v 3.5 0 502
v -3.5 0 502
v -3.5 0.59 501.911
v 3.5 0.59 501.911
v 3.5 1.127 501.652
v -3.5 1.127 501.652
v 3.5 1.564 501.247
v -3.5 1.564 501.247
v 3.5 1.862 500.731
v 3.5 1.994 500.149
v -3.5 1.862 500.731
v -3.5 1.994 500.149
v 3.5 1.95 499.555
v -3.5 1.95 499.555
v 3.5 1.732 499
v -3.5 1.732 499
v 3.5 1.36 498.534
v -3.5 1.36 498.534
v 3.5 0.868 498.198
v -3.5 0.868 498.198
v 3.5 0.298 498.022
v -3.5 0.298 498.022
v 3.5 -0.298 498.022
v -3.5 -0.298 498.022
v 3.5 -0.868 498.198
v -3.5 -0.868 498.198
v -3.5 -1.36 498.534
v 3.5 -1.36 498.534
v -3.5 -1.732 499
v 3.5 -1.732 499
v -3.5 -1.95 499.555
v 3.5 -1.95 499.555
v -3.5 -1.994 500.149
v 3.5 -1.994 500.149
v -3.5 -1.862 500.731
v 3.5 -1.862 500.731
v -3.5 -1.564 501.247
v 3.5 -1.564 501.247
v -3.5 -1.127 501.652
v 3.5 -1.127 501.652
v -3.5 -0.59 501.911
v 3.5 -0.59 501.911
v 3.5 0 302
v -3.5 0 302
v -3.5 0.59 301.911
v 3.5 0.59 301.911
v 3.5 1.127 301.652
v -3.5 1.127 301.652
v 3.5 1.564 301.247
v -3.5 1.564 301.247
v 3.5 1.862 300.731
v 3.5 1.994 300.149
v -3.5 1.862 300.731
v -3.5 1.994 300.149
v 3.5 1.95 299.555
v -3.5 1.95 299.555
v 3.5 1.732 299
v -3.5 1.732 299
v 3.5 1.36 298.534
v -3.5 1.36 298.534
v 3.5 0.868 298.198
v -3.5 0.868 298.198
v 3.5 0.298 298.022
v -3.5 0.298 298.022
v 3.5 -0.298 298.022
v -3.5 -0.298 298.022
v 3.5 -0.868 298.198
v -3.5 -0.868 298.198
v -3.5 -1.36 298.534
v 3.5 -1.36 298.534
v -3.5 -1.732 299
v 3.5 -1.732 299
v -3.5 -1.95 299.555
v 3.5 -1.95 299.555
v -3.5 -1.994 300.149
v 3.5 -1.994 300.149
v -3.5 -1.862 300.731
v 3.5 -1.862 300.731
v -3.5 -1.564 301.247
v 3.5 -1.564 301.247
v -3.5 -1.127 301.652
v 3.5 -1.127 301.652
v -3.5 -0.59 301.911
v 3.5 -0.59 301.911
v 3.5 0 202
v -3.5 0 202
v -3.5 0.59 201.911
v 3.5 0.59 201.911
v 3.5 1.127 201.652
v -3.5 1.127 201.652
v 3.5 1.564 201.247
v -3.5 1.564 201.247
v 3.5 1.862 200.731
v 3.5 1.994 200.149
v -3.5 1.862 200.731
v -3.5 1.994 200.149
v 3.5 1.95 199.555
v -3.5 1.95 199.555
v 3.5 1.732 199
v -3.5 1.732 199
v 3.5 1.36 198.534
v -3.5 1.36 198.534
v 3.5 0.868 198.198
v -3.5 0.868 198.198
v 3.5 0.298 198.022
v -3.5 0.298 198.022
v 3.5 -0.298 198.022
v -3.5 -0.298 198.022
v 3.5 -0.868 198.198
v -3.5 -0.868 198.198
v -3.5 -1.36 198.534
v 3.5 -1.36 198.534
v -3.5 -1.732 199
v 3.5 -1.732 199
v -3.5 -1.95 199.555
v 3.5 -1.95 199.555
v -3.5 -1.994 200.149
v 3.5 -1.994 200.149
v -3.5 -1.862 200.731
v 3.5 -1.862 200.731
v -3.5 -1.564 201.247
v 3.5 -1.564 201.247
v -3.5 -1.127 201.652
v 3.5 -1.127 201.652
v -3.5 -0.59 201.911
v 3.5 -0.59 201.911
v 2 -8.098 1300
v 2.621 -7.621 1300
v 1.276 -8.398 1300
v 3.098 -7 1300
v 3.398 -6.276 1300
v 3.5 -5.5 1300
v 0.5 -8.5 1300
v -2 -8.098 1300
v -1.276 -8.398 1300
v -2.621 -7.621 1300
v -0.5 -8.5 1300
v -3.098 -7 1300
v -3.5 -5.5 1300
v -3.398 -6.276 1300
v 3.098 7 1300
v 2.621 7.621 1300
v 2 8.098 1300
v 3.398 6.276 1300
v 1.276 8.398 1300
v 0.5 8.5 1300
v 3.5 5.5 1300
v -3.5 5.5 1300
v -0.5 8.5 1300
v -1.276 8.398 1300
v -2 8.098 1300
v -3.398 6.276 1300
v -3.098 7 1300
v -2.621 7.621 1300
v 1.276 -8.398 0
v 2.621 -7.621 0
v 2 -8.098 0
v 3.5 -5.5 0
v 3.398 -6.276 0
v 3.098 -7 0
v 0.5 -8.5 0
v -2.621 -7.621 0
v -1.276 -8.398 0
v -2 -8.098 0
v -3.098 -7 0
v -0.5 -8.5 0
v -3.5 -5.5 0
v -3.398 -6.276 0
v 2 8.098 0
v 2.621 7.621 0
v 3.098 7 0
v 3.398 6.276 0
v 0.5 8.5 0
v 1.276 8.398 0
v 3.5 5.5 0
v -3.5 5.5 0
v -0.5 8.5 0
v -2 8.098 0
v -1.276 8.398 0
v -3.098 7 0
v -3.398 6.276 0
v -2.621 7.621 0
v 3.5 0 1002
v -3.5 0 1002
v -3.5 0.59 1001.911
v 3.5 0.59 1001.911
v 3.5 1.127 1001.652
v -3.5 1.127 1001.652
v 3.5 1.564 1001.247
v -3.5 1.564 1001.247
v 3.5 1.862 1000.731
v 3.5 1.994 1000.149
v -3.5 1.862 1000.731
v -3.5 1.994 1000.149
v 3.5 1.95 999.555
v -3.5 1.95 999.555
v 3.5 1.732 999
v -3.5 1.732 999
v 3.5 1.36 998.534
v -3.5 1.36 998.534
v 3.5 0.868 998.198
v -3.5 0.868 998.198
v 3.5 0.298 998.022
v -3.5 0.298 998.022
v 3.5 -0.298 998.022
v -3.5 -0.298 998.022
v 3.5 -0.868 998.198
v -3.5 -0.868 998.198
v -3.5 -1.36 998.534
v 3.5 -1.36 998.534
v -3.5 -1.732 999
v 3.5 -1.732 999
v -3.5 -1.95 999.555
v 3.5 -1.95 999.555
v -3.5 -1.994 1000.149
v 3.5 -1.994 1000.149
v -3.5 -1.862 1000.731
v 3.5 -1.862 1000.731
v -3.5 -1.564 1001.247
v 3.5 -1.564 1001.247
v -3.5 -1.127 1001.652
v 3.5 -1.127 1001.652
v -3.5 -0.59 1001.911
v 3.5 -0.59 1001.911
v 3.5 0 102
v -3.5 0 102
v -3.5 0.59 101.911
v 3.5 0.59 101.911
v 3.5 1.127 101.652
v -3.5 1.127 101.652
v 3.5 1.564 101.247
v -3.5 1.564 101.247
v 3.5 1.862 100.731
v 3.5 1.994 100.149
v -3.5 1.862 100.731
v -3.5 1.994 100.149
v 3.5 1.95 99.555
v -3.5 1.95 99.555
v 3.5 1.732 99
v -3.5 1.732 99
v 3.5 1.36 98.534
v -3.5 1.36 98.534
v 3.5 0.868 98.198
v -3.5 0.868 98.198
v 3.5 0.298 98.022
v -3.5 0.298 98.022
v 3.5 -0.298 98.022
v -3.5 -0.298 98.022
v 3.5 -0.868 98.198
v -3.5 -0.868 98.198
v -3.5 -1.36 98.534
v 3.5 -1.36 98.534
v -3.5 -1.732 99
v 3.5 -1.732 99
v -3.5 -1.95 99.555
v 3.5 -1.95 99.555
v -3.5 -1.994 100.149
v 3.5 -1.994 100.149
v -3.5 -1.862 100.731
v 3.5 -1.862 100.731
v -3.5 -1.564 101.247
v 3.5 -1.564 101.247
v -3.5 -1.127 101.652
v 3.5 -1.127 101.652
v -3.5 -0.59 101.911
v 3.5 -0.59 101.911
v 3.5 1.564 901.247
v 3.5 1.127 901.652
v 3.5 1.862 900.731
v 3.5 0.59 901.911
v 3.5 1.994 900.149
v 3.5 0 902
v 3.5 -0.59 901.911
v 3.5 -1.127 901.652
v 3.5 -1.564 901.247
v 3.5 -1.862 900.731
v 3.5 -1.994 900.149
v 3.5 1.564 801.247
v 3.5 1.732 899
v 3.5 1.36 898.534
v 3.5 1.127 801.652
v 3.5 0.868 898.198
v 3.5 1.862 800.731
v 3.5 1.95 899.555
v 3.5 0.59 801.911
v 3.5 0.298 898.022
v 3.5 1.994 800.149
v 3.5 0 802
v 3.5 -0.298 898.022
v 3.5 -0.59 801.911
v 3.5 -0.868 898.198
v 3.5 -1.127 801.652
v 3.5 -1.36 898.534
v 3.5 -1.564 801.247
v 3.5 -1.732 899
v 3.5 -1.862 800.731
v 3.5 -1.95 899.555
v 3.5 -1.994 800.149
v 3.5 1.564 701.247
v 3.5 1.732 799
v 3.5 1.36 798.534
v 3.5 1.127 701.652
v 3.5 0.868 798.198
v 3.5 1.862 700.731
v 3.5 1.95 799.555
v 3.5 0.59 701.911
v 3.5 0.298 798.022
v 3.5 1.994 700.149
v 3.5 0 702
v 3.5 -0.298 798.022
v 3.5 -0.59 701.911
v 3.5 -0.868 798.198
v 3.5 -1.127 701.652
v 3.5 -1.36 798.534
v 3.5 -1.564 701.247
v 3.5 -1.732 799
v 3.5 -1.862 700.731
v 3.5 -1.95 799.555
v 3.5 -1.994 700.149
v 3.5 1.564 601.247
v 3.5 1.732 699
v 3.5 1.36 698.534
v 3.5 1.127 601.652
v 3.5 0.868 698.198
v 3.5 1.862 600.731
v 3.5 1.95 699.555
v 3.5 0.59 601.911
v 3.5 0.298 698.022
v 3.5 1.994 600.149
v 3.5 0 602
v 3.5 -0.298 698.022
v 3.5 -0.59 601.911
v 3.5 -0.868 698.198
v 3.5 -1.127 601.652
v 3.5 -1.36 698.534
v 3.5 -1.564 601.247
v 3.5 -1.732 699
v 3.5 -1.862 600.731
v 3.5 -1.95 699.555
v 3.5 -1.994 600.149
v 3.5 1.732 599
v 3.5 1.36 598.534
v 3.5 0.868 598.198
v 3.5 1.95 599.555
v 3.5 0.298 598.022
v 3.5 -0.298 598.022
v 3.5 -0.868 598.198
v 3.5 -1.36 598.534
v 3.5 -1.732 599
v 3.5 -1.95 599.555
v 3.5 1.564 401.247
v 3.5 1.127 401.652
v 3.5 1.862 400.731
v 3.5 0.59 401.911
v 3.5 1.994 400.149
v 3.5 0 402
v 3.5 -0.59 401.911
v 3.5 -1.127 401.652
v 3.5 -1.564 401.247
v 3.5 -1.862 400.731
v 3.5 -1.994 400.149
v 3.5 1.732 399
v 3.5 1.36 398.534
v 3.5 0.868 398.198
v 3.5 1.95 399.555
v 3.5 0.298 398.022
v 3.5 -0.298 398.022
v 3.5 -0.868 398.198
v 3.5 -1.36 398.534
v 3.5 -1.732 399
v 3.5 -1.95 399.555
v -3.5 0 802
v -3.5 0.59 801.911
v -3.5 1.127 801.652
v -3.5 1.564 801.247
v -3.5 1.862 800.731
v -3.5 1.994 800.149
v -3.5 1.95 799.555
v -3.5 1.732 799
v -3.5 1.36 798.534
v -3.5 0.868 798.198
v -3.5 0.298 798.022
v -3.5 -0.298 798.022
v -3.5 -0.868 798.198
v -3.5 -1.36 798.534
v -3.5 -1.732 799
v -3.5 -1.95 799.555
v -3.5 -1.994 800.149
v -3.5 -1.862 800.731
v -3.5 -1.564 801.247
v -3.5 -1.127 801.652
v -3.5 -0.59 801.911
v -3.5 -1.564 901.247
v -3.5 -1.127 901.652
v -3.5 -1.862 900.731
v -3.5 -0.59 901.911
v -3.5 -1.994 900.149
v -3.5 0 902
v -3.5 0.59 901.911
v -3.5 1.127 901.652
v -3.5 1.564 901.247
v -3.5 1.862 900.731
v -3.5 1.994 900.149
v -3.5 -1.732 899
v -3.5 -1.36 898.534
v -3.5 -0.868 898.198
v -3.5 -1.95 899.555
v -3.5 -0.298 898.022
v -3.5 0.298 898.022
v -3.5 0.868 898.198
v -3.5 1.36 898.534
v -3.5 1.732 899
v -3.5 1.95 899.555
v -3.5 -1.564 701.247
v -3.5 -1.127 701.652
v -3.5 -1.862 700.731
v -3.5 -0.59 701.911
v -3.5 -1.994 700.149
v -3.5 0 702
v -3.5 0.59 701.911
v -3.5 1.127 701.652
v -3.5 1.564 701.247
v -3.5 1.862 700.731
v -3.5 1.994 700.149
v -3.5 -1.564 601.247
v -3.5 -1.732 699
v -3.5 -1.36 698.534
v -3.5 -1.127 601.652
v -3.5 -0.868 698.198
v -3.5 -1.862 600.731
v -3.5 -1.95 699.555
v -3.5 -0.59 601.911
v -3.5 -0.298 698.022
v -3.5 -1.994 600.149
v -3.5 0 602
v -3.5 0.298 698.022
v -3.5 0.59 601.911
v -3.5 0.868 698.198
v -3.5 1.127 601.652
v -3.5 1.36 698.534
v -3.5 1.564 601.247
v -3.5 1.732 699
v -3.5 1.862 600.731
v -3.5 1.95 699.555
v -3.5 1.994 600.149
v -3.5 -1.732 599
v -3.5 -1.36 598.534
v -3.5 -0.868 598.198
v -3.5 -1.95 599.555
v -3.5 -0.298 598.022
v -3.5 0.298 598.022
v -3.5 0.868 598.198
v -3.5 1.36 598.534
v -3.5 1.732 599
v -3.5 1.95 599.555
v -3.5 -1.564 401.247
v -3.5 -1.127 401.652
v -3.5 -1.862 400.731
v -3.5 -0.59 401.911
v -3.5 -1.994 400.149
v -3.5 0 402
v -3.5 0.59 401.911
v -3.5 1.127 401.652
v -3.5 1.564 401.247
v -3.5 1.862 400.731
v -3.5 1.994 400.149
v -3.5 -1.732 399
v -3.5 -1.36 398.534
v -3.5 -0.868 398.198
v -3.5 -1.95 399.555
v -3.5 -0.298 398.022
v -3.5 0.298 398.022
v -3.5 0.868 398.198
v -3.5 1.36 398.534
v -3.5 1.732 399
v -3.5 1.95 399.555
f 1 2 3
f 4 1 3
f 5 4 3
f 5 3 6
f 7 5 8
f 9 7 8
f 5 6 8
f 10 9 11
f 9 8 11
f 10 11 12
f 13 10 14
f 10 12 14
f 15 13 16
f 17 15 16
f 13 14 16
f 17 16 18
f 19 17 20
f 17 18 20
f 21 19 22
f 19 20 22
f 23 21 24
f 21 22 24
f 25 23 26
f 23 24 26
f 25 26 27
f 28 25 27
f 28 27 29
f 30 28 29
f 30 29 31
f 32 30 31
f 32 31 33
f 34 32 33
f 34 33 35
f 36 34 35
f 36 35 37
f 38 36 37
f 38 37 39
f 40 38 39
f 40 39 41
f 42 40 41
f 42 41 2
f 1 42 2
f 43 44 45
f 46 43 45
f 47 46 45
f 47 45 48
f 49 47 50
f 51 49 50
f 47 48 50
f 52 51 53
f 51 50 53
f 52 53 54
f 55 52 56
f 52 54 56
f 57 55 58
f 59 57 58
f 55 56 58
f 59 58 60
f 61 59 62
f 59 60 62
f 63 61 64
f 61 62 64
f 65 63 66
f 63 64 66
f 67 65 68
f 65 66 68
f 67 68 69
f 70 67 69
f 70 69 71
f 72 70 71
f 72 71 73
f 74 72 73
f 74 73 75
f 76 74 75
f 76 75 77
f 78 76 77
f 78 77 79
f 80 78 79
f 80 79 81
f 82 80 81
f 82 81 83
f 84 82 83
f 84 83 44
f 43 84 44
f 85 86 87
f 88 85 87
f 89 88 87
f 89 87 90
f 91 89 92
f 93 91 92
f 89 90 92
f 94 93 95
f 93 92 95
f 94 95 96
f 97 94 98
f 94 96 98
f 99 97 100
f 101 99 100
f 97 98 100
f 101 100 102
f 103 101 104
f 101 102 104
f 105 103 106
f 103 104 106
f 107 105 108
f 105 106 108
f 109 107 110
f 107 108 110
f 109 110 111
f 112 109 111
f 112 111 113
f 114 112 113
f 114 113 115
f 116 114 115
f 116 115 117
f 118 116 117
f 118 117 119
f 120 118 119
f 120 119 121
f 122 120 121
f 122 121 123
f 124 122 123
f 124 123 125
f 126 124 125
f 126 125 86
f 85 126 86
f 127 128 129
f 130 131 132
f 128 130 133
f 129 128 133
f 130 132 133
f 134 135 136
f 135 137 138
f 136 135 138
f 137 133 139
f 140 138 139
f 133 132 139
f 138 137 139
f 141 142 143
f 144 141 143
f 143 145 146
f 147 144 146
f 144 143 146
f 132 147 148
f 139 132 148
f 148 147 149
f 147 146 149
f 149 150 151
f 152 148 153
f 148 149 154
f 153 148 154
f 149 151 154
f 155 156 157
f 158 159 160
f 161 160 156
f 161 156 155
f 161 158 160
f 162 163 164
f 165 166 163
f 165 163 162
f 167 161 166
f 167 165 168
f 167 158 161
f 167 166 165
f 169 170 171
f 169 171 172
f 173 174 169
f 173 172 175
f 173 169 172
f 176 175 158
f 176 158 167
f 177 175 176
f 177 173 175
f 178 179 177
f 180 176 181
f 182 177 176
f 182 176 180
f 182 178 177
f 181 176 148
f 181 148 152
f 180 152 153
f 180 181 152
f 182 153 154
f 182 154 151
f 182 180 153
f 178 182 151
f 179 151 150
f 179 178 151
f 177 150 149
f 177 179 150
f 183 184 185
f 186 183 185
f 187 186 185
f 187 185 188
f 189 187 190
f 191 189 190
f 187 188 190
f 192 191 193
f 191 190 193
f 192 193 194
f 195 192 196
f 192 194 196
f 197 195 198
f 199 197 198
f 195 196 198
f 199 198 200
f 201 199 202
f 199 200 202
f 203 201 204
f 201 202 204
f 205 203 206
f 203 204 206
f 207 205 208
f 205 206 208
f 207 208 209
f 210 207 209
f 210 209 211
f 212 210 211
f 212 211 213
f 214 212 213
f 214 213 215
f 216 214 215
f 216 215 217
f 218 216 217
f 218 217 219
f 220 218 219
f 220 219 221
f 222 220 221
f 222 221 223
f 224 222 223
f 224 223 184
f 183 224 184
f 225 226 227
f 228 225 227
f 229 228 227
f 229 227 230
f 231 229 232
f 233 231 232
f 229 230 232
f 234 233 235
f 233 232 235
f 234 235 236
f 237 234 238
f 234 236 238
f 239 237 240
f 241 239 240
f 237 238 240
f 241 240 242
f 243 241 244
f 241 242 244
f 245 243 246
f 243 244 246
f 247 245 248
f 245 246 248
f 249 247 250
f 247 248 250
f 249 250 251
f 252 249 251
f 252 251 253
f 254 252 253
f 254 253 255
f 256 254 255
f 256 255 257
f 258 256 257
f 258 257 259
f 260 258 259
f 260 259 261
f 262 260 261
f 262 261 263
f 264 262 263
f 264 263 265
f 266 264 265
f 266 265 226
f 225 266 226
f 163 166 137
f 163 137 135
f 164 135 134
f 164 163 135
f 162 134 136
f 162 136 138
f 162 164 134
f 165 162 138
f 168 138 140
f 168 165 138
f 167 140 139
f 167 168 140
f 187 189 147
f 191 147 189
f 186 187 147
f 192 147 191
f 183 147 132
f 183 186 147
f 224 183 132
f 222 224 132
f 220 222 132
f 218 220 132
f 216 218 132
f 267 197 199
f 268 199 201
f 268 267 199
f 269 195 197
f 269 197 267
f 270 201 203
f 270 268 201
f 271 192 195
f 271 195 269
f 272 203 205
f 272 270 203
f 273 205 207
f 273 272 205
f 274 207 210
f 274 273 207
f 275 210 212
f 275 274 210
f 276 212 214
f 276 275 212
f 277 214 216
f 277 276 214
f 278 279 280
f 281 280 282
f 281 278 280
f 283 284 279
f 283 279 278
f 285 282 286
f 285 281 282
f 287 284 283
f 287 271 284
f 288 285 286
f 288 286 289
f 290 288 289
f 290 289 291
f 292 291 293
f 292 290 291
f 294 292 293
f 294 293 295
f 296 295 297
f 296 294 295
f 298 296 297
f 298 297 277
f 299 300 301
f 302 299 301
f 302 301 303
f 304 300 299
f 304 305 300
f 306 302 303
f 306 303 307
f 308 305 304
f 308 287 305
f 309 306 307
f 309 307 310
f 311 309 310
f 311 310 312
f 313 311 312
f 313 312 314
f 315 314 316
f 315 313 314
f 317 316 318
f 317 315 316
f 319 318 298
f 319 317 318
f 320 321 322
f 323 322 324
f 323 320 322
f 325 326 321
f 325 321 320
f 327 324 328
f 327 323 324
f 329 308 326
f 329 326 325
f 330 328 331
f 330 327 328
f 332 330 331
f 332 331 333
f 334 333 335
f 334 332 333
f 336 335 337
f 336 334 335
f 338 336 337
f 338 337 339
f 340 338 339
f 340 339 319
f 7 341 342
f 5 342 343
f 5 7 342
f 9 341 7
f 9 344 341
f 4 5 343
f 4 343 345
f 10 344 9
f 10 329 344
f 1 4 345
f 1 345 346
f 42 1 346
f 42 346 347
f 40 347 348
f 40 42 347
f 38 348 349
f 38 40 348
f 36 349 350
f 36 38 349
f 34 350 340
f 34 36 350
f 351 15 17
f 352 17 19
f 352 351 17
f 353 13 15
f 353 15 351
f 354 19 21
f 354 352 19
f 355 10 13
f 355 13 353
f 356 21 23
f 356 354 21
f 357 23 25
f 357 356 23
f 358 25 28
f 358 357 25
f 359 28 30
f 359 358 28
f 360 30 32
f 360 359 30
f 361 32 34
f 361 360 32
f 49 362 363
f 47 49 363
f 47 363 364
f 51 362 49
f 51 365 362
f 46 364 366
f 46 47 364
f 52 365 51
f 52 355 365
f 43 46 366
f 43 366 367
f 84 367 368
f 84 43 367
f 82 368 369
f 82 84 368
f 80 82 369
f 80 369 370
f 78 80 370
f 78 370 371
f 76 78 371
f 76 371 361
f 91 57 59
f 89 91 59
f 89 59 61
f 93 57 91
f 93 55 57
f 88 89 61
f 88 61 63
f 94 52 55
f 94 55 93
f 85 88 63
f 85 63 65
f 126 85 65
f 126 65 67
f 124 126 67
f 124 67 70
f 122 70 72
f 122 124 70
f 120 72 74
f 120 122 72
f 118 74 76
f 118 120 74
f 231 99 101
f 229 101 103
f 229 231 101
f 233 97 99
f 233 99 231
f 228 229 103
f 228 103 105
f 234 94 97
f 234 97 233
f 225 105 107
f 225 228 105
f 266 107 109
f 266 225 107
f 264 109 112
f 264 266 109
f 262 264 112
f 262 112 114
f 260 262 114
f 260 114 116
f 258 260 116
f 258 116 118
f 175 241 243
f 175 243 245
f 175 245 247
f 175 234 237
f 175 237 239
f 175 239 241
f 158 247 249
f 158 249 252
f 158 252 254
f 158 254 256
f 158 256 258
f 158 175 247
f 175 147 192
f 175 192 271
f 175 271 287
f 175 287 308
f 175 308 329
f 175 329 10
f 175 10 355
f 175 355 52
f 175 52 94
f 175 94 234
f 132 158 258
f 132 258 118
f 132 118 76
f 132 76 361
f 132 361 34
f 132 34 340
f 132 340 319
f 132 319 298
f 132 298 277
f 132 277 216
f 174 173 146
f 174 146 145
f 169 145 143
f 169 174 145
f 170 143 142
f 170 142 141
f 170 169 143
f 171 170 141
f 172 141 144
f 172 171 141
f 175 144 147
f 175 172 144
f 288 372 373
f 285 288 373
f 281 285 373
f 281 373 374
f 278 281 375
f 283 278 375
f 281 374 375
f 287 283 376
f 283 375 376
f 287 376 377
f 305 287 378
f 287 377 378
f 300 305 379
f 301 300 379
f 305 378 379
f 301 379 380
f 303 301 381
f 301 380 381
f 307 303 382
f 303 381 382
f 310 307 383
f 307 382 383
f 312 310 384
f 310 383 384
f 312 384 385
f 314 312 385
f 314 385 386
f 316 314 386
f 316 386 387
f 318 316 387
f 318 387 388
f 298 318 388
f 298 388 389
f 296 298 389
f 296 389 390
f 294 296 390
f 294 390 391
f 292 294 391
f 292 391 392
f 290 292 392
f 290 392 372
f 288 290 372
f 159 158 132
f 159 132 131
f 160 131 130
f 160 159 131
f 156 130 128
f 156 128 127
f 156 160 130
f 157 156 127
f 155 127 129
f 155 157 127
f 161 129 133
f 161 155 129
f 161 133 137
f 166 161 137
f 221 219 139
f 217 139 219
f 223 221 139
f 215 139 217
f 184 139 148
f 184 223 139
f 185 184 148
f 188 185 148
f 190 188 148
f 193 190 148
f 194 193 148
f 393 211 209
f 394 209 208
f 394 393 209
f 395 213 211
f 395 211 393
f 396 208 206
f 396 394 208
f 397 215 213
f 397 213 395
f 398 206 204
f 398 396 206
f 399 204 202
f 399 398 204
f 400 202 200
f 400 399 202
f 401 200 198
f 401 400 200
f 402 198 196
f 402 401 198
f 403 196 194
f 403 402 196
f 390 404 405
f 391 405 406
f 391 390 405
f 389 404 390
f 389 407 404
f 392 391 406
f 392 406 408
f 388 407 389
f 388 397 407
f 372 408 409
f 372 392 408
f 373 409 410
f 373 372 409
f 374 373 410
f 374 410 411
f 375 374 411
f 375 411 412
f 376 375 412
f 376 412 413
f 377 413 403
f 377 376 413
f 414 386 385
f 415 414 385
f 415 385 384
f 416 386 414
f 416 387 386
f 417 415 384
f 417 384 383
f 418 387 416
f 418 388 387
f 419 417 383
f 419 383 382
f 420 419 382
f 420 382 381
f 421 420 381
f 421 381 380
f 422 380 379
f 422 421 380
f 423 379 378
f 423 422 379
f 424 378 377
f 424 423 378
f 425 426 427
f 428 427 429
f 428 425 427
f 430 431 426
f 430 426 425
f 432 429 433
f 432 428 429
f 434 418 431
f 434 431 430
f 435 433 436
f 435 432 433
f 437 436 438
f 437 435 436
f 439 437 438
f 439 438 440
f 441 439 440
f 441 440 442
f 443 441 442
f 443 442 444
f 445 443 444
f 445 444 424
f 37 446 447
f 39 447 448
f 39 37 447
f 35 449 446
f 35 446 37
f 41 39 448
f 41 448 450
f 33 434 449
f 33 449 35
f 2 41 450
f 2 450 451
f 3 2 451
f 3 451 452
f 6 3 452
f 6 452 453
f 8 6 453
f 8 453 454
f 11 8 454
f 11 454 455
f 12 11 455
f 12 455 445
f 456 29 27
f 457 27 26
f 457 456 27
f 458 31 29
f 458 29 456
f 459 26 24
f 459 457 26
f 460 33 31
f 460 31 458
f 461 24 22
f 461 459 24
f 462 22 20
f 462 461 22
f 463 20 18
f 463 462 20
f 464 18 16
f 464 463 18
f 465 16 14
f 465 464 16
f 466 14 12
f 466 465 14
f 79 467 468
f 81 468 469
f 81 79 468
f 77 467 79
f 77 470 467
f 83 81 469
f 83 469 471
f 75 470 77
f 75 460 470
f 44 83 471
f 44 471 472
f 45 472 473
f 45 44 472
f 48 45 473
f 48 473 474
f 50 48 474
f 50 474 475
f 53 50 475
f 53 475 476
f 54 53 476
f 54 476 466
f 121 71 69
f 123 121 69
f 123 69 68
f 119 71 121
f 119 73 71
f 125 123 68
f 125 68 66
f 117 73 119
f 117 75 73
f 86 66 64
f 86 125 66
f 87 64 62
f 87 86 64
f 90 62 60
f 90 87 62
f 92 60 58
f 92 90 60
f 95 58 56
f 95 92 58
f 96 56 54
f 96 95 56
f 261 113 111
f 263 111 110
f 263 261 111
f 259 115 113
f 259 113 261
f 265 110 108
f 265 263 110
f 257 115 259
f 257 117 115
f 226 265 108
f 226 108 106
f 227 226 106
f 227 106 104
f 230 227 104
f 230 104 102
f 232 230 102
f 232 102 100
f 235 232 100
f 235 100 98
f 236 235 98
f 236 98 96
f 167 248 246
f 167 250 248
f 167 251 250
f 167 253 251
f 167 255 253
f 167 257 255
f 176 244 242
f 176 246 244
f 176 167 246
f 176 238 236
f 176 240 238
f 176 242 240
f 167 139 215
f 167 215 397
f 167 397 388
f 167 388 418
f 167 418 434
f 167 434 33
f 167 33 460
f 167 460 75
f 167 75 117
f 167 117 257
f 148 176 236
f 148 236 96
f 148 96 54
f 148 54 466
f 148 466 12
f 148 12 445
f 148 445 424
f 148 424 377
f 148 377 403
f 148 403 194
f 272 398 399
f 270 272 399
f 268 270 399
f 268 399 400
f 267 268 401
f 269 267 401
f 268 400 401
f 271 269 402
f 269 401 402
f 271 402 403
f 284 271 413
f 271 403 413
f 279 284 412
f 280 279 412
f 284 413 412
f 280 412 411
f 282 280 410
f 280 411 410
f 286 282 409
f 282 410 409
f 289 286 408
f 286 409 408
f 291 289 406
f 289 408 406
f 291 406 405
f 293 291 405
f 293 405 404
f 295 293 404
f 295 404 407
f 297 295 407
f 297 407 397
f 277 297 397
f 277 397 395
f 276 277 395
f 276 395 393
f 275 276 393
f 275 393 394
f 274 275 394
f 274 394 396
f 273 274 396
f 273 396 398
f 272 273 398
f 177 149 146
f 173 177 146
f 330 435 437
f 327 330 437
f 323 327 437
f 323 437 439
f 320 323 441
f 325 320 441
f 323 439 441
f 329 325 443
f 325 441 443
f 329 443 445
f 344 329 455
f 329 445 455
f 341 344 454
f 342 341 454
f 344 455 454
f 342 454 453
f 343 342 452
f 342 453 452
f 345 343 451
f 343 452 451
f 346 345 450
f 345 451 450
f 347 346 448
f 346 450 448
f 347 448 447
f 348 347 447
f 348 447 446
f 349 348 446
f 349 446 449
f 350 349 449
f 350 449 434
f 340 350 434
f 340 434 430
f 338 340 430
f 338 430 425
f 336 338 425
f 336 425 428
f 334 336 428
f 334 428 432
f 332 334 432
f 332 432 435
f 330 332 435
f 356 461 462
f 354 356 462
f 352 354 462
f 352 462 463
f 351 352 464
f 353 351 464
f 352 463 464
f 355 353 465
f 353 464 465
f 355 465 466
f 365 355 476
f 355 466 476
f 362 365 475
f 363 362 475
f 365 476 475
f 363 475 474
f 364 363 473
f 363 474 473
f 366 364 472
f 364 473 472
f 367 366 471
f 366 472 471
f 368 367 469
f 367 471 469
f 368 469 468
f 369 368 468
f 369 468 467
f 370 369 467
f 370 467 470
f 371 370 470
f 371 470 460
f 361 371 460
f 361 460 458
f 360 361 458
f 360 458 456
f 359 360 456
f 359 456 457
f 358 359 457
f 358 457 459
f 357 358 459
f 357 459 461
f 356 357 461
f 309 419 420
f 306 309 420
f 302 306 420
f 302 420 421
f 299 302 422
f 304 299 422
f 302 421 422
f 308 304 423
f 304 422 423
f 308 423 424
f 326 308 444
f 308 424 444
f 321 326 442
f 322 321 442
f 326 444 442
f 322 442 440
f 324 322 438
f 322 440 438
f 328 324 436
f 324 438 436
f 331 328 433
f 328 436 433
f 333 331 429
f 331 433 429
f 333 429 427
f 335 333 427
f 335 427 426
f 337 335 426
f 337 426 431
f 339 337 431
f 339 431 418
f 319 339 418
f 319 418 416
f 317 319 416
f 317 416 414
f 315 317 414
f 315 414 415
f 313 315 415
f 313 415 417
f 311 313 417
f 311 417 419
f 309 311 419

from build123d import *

# Parameters (mm, degrees)
EXTRUDE_1_DEPTH     = 1300
SKETCH_3_R          = 2
CUT_EXTRUDE_1_DEPTH = 1301.046633779


with BuildPart() as part:
    # 草图2 → 凸台-拉伸1 (new body)
    with BuildSketch(Plane.XY):
        with BuildLine():
            Line((-0.5, 8.5), (0.5, 8.5))
            ThreePointArc((0.5, 8.5), (2.621320344, 7.621320344), (3.5, 5.5))
            Line((3.5, 5.5), (3.5, -5.5))
            ThreePointArc((3.5, -5.5), (2.621320344, -7.621320344), (0.5, -8.5))
            Line((0.5, -8.5), (-0.5, -8.5))
            ThreePointArc((-0.5, -8.5), (-2.621320344, -7.621320344), (-3.5, -5.5))
            Line((-3.5, -5.5), (-3.5, 5.5))
            ThreePointArc((-3.5, 5.5), (-2.621320344, 7.621320344), (-0.5, 8.5))
        make_face()
    extrude(amount=EXTRUDE_1_DEPTH)

    # 草图3 → 切除-拉伸1 (cut, through all)
    with BuildSketch(Plane.ZY.offset(3.5)):
        with Locations((100, 0)):
            Circle(SKETCH_3_R)
        with Locations((200, 0)):
            Circle(SKETCH_3_R)
        with Locations((300, 0)):
            Circle(SKETCH_3_R)
        with Locations((400, 0)):
            Circle(SKETCH_3_R)
        with Locations((500, 0)):
            Circle(SKETCH_3_R)
        with Locations((600, 0)):
            Circle(SKETCH_3_R)
        with Locations((700, 0)):
            Circle(SKETCH_3_R)
        with Locations((800, 0)):
            Circle(SKETCH_3_R)
        with Locations((900, 0)):
            Circle(SKETCH_3_R)
        with Locations((1000, 0)):
            Circle(SKETCH_3_R)
    extrude(amount=-CUT_EXTRUDE_1_DEPTH, mode=Mode.SUBTRACT)


solid = part.part
